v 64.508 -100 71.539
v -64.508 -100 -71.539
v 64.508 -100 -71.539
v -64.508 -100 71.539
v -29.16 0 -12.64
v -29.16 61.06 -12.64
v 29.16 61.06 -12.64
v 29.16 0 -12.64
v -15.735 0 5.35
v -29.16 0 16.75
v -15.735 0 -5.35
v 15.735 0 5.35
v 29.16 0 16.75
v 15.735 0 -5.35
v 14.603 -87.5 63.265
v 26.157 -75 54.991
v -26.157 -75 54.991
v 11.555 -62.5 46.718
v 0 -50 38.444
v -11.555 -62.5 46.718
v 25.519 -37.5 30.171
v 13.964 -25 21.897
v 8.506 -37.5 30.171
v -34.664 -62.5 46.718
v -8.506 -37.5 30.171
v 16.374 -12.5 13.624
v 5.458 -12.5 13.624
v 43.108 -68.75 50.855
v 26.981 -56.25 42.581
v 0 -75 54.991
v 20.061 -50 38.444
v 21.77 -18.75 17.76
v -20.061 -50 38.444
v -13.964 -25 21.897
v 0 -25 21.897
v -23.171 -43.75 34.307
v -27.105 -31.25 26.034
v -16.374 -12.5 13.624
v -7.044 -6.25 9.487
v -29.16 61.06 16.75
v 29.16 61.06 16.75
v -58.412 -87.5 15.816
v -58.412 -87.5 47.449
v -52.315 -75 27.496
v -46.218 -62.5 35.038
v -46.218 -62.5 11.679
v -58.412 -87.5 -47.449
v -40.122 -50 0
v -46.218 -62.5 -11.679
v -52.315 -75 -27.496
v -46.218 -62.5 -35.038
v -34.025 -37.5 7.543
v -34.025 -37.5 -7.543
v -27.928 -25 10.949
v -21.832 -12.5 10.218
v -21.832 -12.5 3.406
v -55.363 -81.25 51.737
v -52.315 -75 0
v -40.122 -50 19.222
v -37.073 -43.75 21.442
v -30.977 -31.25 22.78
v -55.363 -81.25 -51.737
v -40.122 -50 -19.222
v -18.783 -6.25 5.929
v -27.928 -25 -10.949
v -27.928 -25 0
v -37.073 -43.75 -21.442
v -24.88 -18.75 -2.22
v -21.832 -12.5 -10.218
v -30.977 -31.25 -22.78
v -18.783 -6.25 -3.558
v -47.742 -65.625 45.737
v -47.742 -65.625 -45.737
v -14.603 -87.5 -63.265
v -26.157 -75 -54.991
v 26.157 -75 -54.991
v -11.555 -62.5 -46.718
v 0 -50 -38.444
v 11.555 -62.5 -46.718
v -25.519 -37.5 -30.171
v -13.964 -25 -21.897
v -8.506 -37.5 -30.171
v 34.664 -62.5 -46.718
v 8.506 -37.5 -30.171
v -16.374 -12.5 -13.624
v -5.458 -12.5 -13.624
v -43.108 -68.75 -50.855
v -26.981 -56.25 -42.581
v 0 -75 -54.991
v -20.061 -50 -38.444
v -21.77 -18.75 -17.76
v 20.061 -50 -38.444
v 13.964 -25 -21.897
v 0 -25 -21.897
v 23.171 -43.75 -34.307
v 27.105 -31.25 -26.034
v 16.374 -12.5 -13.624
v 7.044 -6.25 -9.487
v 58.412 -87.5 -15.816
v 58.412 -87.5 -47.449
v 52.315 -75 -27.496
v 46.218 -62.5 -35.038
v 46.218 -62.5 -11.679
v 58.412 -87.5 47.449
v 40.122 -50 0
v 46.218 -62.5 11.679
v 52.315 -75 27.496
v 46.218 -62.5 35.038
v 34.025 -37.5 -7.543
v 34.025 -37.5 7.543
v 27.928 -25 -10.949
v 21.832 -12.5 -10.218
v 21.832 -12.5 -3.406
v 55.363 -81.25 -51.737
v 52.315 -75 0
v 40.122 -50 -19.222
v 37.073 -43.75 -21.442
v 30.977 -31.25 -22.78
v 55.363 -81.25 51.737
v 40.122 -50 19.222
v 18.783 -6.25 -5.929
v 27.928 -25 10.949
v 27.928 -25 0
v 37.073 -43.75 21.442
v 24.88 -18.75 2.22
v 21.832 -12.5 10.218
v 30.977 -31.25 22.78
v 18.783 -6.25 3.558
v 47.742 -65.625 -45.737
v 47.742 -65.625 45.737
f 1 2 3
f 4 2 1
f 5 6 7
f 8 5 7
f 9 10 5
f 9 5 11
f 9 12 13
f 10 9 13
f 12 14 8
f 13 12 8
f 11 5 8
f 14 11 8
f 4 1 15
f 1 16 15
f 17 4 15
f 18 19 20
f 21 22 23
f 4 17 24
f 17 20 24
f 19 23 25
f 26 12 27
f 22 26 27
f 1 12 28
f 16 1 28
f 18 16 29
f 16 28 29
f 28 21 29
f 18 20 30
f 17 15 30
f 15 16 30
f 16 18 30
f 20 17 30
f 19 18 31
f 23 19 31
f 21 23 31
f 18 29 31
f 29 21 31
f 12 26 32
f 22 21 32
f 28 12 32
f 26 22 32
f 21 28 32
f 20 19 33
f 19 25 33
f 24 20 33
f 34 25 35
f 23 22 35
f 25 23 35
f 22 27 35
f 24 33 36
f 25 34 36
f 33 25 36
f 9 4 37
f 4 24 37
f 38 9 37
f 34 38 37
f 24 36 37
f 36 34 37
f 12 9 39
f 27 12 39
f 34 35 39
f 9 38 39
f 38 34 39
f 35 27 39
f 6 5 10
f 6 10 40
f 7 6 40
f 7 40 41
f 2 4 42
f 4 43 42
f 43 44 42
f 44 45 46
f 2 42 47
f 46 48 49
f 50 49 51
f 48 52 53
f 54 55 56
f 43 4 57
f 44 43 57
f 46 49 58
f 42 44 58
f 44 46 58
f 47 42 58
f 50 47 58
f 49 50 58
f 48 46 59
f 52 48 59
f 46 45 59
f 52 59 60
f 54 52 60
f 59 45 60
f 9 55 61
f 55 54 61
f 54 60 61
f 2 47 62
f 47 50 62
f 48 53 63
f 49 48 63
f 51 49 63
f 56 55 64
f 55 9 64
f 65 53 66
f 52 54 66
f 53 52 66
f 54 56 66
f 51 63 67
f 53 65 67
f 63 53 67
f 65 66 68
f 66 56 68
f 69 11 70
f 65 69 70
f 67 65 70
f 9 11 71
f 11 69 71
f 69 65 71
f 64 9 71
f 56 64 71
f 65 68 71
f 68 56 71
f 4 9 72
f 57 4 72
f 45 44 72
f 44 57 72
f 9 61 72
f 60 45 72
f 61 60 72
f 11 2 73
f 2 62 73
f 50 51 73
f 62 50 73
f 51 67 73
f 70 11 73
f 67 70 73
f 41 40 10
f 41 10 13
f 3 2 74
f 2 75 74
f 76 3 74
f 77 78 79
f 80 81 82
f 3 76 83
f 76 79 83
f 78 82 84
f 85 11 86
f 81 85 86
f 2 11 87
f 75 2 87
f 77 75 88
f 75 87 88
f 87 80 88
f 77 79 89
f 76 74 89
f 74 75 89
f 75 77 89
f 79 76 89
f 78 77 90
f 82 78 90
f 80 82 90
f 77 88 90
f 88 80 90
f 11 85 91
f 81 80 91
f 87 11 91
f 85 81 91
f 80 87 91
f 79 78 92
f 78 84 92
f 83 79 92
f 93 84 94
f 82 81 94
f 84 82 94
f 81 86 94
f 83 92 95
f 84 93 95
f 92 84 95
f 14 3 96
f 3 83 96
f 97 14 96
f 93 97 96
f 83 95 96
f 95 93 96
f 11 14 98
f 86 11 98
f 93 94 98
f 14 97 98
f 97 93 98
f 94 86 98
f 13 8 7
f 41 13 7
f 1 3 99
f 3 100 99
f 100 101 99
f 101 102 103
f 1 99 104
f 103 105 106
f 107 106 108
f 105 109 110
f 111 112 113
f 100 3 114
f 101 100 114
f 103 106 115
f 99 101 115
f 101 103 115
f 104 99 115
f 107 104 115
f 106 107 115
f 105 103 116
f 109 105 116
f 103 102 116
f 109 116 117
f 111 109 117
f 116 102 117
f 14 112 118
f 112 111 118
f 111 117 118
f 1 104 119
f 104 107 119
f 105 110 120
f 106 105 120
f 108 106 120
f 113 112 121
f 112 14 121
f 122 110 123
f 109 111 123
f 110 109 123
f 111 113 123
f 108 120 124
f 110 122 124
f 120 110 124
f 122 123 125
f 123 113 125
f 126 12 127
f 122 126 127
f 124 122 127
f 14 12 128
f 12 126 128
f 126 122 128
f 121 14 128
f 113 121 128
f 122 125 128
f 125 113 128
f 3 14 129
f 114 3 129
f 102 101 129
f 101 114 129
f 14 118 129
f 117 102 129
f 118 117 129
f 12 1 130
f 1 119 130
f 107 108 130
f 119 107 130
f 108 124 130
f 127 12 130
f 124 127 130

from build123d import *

# Parameters (mm, degrees)
F1_W     = 58.32
F1_H     = 61.06
F1_R     = 1.5
F2_DEPTH = 29.39
F8_W     = 129.0165177132
F8_H     = 143.0771122391
F3_W     = 31.47
F3_H     = 10.7


with BuildPart() as f2:
    # F1 (on offset) → F2 (new body)
    with BuildSketch(Plane.XY.offset(-12.64)):
        with Locations((0, 30.53)):
            Rectangle(F1_W, F1_H)
        with Locations((15.73, 16.46)):
            Circle(F1_R, mode=Mode.SUBTRACT)
        with Locations((-15.77, 46.69)):
            Circle(F1_R, mode=Mode.SUBTRACT)
        with Locations((-15.77, 46.69)):
            Circle(F1_R)
        with Locations((15.73, 16.46)):
            Circle(F1_R)
    extrude(amount=F2_DEPTH)

    # F8 (on offset) → F9 section 0
    with BuildSketch(Plane.XZ.offset(100)):
        Rectangle(F8_W, F8_H)
    # F3 (on face) → F9 section 1
    with BuildSketch(Plane.XZ):
        Rectangle(F3_W, F3_H)
    loft()


solid = f2.part
